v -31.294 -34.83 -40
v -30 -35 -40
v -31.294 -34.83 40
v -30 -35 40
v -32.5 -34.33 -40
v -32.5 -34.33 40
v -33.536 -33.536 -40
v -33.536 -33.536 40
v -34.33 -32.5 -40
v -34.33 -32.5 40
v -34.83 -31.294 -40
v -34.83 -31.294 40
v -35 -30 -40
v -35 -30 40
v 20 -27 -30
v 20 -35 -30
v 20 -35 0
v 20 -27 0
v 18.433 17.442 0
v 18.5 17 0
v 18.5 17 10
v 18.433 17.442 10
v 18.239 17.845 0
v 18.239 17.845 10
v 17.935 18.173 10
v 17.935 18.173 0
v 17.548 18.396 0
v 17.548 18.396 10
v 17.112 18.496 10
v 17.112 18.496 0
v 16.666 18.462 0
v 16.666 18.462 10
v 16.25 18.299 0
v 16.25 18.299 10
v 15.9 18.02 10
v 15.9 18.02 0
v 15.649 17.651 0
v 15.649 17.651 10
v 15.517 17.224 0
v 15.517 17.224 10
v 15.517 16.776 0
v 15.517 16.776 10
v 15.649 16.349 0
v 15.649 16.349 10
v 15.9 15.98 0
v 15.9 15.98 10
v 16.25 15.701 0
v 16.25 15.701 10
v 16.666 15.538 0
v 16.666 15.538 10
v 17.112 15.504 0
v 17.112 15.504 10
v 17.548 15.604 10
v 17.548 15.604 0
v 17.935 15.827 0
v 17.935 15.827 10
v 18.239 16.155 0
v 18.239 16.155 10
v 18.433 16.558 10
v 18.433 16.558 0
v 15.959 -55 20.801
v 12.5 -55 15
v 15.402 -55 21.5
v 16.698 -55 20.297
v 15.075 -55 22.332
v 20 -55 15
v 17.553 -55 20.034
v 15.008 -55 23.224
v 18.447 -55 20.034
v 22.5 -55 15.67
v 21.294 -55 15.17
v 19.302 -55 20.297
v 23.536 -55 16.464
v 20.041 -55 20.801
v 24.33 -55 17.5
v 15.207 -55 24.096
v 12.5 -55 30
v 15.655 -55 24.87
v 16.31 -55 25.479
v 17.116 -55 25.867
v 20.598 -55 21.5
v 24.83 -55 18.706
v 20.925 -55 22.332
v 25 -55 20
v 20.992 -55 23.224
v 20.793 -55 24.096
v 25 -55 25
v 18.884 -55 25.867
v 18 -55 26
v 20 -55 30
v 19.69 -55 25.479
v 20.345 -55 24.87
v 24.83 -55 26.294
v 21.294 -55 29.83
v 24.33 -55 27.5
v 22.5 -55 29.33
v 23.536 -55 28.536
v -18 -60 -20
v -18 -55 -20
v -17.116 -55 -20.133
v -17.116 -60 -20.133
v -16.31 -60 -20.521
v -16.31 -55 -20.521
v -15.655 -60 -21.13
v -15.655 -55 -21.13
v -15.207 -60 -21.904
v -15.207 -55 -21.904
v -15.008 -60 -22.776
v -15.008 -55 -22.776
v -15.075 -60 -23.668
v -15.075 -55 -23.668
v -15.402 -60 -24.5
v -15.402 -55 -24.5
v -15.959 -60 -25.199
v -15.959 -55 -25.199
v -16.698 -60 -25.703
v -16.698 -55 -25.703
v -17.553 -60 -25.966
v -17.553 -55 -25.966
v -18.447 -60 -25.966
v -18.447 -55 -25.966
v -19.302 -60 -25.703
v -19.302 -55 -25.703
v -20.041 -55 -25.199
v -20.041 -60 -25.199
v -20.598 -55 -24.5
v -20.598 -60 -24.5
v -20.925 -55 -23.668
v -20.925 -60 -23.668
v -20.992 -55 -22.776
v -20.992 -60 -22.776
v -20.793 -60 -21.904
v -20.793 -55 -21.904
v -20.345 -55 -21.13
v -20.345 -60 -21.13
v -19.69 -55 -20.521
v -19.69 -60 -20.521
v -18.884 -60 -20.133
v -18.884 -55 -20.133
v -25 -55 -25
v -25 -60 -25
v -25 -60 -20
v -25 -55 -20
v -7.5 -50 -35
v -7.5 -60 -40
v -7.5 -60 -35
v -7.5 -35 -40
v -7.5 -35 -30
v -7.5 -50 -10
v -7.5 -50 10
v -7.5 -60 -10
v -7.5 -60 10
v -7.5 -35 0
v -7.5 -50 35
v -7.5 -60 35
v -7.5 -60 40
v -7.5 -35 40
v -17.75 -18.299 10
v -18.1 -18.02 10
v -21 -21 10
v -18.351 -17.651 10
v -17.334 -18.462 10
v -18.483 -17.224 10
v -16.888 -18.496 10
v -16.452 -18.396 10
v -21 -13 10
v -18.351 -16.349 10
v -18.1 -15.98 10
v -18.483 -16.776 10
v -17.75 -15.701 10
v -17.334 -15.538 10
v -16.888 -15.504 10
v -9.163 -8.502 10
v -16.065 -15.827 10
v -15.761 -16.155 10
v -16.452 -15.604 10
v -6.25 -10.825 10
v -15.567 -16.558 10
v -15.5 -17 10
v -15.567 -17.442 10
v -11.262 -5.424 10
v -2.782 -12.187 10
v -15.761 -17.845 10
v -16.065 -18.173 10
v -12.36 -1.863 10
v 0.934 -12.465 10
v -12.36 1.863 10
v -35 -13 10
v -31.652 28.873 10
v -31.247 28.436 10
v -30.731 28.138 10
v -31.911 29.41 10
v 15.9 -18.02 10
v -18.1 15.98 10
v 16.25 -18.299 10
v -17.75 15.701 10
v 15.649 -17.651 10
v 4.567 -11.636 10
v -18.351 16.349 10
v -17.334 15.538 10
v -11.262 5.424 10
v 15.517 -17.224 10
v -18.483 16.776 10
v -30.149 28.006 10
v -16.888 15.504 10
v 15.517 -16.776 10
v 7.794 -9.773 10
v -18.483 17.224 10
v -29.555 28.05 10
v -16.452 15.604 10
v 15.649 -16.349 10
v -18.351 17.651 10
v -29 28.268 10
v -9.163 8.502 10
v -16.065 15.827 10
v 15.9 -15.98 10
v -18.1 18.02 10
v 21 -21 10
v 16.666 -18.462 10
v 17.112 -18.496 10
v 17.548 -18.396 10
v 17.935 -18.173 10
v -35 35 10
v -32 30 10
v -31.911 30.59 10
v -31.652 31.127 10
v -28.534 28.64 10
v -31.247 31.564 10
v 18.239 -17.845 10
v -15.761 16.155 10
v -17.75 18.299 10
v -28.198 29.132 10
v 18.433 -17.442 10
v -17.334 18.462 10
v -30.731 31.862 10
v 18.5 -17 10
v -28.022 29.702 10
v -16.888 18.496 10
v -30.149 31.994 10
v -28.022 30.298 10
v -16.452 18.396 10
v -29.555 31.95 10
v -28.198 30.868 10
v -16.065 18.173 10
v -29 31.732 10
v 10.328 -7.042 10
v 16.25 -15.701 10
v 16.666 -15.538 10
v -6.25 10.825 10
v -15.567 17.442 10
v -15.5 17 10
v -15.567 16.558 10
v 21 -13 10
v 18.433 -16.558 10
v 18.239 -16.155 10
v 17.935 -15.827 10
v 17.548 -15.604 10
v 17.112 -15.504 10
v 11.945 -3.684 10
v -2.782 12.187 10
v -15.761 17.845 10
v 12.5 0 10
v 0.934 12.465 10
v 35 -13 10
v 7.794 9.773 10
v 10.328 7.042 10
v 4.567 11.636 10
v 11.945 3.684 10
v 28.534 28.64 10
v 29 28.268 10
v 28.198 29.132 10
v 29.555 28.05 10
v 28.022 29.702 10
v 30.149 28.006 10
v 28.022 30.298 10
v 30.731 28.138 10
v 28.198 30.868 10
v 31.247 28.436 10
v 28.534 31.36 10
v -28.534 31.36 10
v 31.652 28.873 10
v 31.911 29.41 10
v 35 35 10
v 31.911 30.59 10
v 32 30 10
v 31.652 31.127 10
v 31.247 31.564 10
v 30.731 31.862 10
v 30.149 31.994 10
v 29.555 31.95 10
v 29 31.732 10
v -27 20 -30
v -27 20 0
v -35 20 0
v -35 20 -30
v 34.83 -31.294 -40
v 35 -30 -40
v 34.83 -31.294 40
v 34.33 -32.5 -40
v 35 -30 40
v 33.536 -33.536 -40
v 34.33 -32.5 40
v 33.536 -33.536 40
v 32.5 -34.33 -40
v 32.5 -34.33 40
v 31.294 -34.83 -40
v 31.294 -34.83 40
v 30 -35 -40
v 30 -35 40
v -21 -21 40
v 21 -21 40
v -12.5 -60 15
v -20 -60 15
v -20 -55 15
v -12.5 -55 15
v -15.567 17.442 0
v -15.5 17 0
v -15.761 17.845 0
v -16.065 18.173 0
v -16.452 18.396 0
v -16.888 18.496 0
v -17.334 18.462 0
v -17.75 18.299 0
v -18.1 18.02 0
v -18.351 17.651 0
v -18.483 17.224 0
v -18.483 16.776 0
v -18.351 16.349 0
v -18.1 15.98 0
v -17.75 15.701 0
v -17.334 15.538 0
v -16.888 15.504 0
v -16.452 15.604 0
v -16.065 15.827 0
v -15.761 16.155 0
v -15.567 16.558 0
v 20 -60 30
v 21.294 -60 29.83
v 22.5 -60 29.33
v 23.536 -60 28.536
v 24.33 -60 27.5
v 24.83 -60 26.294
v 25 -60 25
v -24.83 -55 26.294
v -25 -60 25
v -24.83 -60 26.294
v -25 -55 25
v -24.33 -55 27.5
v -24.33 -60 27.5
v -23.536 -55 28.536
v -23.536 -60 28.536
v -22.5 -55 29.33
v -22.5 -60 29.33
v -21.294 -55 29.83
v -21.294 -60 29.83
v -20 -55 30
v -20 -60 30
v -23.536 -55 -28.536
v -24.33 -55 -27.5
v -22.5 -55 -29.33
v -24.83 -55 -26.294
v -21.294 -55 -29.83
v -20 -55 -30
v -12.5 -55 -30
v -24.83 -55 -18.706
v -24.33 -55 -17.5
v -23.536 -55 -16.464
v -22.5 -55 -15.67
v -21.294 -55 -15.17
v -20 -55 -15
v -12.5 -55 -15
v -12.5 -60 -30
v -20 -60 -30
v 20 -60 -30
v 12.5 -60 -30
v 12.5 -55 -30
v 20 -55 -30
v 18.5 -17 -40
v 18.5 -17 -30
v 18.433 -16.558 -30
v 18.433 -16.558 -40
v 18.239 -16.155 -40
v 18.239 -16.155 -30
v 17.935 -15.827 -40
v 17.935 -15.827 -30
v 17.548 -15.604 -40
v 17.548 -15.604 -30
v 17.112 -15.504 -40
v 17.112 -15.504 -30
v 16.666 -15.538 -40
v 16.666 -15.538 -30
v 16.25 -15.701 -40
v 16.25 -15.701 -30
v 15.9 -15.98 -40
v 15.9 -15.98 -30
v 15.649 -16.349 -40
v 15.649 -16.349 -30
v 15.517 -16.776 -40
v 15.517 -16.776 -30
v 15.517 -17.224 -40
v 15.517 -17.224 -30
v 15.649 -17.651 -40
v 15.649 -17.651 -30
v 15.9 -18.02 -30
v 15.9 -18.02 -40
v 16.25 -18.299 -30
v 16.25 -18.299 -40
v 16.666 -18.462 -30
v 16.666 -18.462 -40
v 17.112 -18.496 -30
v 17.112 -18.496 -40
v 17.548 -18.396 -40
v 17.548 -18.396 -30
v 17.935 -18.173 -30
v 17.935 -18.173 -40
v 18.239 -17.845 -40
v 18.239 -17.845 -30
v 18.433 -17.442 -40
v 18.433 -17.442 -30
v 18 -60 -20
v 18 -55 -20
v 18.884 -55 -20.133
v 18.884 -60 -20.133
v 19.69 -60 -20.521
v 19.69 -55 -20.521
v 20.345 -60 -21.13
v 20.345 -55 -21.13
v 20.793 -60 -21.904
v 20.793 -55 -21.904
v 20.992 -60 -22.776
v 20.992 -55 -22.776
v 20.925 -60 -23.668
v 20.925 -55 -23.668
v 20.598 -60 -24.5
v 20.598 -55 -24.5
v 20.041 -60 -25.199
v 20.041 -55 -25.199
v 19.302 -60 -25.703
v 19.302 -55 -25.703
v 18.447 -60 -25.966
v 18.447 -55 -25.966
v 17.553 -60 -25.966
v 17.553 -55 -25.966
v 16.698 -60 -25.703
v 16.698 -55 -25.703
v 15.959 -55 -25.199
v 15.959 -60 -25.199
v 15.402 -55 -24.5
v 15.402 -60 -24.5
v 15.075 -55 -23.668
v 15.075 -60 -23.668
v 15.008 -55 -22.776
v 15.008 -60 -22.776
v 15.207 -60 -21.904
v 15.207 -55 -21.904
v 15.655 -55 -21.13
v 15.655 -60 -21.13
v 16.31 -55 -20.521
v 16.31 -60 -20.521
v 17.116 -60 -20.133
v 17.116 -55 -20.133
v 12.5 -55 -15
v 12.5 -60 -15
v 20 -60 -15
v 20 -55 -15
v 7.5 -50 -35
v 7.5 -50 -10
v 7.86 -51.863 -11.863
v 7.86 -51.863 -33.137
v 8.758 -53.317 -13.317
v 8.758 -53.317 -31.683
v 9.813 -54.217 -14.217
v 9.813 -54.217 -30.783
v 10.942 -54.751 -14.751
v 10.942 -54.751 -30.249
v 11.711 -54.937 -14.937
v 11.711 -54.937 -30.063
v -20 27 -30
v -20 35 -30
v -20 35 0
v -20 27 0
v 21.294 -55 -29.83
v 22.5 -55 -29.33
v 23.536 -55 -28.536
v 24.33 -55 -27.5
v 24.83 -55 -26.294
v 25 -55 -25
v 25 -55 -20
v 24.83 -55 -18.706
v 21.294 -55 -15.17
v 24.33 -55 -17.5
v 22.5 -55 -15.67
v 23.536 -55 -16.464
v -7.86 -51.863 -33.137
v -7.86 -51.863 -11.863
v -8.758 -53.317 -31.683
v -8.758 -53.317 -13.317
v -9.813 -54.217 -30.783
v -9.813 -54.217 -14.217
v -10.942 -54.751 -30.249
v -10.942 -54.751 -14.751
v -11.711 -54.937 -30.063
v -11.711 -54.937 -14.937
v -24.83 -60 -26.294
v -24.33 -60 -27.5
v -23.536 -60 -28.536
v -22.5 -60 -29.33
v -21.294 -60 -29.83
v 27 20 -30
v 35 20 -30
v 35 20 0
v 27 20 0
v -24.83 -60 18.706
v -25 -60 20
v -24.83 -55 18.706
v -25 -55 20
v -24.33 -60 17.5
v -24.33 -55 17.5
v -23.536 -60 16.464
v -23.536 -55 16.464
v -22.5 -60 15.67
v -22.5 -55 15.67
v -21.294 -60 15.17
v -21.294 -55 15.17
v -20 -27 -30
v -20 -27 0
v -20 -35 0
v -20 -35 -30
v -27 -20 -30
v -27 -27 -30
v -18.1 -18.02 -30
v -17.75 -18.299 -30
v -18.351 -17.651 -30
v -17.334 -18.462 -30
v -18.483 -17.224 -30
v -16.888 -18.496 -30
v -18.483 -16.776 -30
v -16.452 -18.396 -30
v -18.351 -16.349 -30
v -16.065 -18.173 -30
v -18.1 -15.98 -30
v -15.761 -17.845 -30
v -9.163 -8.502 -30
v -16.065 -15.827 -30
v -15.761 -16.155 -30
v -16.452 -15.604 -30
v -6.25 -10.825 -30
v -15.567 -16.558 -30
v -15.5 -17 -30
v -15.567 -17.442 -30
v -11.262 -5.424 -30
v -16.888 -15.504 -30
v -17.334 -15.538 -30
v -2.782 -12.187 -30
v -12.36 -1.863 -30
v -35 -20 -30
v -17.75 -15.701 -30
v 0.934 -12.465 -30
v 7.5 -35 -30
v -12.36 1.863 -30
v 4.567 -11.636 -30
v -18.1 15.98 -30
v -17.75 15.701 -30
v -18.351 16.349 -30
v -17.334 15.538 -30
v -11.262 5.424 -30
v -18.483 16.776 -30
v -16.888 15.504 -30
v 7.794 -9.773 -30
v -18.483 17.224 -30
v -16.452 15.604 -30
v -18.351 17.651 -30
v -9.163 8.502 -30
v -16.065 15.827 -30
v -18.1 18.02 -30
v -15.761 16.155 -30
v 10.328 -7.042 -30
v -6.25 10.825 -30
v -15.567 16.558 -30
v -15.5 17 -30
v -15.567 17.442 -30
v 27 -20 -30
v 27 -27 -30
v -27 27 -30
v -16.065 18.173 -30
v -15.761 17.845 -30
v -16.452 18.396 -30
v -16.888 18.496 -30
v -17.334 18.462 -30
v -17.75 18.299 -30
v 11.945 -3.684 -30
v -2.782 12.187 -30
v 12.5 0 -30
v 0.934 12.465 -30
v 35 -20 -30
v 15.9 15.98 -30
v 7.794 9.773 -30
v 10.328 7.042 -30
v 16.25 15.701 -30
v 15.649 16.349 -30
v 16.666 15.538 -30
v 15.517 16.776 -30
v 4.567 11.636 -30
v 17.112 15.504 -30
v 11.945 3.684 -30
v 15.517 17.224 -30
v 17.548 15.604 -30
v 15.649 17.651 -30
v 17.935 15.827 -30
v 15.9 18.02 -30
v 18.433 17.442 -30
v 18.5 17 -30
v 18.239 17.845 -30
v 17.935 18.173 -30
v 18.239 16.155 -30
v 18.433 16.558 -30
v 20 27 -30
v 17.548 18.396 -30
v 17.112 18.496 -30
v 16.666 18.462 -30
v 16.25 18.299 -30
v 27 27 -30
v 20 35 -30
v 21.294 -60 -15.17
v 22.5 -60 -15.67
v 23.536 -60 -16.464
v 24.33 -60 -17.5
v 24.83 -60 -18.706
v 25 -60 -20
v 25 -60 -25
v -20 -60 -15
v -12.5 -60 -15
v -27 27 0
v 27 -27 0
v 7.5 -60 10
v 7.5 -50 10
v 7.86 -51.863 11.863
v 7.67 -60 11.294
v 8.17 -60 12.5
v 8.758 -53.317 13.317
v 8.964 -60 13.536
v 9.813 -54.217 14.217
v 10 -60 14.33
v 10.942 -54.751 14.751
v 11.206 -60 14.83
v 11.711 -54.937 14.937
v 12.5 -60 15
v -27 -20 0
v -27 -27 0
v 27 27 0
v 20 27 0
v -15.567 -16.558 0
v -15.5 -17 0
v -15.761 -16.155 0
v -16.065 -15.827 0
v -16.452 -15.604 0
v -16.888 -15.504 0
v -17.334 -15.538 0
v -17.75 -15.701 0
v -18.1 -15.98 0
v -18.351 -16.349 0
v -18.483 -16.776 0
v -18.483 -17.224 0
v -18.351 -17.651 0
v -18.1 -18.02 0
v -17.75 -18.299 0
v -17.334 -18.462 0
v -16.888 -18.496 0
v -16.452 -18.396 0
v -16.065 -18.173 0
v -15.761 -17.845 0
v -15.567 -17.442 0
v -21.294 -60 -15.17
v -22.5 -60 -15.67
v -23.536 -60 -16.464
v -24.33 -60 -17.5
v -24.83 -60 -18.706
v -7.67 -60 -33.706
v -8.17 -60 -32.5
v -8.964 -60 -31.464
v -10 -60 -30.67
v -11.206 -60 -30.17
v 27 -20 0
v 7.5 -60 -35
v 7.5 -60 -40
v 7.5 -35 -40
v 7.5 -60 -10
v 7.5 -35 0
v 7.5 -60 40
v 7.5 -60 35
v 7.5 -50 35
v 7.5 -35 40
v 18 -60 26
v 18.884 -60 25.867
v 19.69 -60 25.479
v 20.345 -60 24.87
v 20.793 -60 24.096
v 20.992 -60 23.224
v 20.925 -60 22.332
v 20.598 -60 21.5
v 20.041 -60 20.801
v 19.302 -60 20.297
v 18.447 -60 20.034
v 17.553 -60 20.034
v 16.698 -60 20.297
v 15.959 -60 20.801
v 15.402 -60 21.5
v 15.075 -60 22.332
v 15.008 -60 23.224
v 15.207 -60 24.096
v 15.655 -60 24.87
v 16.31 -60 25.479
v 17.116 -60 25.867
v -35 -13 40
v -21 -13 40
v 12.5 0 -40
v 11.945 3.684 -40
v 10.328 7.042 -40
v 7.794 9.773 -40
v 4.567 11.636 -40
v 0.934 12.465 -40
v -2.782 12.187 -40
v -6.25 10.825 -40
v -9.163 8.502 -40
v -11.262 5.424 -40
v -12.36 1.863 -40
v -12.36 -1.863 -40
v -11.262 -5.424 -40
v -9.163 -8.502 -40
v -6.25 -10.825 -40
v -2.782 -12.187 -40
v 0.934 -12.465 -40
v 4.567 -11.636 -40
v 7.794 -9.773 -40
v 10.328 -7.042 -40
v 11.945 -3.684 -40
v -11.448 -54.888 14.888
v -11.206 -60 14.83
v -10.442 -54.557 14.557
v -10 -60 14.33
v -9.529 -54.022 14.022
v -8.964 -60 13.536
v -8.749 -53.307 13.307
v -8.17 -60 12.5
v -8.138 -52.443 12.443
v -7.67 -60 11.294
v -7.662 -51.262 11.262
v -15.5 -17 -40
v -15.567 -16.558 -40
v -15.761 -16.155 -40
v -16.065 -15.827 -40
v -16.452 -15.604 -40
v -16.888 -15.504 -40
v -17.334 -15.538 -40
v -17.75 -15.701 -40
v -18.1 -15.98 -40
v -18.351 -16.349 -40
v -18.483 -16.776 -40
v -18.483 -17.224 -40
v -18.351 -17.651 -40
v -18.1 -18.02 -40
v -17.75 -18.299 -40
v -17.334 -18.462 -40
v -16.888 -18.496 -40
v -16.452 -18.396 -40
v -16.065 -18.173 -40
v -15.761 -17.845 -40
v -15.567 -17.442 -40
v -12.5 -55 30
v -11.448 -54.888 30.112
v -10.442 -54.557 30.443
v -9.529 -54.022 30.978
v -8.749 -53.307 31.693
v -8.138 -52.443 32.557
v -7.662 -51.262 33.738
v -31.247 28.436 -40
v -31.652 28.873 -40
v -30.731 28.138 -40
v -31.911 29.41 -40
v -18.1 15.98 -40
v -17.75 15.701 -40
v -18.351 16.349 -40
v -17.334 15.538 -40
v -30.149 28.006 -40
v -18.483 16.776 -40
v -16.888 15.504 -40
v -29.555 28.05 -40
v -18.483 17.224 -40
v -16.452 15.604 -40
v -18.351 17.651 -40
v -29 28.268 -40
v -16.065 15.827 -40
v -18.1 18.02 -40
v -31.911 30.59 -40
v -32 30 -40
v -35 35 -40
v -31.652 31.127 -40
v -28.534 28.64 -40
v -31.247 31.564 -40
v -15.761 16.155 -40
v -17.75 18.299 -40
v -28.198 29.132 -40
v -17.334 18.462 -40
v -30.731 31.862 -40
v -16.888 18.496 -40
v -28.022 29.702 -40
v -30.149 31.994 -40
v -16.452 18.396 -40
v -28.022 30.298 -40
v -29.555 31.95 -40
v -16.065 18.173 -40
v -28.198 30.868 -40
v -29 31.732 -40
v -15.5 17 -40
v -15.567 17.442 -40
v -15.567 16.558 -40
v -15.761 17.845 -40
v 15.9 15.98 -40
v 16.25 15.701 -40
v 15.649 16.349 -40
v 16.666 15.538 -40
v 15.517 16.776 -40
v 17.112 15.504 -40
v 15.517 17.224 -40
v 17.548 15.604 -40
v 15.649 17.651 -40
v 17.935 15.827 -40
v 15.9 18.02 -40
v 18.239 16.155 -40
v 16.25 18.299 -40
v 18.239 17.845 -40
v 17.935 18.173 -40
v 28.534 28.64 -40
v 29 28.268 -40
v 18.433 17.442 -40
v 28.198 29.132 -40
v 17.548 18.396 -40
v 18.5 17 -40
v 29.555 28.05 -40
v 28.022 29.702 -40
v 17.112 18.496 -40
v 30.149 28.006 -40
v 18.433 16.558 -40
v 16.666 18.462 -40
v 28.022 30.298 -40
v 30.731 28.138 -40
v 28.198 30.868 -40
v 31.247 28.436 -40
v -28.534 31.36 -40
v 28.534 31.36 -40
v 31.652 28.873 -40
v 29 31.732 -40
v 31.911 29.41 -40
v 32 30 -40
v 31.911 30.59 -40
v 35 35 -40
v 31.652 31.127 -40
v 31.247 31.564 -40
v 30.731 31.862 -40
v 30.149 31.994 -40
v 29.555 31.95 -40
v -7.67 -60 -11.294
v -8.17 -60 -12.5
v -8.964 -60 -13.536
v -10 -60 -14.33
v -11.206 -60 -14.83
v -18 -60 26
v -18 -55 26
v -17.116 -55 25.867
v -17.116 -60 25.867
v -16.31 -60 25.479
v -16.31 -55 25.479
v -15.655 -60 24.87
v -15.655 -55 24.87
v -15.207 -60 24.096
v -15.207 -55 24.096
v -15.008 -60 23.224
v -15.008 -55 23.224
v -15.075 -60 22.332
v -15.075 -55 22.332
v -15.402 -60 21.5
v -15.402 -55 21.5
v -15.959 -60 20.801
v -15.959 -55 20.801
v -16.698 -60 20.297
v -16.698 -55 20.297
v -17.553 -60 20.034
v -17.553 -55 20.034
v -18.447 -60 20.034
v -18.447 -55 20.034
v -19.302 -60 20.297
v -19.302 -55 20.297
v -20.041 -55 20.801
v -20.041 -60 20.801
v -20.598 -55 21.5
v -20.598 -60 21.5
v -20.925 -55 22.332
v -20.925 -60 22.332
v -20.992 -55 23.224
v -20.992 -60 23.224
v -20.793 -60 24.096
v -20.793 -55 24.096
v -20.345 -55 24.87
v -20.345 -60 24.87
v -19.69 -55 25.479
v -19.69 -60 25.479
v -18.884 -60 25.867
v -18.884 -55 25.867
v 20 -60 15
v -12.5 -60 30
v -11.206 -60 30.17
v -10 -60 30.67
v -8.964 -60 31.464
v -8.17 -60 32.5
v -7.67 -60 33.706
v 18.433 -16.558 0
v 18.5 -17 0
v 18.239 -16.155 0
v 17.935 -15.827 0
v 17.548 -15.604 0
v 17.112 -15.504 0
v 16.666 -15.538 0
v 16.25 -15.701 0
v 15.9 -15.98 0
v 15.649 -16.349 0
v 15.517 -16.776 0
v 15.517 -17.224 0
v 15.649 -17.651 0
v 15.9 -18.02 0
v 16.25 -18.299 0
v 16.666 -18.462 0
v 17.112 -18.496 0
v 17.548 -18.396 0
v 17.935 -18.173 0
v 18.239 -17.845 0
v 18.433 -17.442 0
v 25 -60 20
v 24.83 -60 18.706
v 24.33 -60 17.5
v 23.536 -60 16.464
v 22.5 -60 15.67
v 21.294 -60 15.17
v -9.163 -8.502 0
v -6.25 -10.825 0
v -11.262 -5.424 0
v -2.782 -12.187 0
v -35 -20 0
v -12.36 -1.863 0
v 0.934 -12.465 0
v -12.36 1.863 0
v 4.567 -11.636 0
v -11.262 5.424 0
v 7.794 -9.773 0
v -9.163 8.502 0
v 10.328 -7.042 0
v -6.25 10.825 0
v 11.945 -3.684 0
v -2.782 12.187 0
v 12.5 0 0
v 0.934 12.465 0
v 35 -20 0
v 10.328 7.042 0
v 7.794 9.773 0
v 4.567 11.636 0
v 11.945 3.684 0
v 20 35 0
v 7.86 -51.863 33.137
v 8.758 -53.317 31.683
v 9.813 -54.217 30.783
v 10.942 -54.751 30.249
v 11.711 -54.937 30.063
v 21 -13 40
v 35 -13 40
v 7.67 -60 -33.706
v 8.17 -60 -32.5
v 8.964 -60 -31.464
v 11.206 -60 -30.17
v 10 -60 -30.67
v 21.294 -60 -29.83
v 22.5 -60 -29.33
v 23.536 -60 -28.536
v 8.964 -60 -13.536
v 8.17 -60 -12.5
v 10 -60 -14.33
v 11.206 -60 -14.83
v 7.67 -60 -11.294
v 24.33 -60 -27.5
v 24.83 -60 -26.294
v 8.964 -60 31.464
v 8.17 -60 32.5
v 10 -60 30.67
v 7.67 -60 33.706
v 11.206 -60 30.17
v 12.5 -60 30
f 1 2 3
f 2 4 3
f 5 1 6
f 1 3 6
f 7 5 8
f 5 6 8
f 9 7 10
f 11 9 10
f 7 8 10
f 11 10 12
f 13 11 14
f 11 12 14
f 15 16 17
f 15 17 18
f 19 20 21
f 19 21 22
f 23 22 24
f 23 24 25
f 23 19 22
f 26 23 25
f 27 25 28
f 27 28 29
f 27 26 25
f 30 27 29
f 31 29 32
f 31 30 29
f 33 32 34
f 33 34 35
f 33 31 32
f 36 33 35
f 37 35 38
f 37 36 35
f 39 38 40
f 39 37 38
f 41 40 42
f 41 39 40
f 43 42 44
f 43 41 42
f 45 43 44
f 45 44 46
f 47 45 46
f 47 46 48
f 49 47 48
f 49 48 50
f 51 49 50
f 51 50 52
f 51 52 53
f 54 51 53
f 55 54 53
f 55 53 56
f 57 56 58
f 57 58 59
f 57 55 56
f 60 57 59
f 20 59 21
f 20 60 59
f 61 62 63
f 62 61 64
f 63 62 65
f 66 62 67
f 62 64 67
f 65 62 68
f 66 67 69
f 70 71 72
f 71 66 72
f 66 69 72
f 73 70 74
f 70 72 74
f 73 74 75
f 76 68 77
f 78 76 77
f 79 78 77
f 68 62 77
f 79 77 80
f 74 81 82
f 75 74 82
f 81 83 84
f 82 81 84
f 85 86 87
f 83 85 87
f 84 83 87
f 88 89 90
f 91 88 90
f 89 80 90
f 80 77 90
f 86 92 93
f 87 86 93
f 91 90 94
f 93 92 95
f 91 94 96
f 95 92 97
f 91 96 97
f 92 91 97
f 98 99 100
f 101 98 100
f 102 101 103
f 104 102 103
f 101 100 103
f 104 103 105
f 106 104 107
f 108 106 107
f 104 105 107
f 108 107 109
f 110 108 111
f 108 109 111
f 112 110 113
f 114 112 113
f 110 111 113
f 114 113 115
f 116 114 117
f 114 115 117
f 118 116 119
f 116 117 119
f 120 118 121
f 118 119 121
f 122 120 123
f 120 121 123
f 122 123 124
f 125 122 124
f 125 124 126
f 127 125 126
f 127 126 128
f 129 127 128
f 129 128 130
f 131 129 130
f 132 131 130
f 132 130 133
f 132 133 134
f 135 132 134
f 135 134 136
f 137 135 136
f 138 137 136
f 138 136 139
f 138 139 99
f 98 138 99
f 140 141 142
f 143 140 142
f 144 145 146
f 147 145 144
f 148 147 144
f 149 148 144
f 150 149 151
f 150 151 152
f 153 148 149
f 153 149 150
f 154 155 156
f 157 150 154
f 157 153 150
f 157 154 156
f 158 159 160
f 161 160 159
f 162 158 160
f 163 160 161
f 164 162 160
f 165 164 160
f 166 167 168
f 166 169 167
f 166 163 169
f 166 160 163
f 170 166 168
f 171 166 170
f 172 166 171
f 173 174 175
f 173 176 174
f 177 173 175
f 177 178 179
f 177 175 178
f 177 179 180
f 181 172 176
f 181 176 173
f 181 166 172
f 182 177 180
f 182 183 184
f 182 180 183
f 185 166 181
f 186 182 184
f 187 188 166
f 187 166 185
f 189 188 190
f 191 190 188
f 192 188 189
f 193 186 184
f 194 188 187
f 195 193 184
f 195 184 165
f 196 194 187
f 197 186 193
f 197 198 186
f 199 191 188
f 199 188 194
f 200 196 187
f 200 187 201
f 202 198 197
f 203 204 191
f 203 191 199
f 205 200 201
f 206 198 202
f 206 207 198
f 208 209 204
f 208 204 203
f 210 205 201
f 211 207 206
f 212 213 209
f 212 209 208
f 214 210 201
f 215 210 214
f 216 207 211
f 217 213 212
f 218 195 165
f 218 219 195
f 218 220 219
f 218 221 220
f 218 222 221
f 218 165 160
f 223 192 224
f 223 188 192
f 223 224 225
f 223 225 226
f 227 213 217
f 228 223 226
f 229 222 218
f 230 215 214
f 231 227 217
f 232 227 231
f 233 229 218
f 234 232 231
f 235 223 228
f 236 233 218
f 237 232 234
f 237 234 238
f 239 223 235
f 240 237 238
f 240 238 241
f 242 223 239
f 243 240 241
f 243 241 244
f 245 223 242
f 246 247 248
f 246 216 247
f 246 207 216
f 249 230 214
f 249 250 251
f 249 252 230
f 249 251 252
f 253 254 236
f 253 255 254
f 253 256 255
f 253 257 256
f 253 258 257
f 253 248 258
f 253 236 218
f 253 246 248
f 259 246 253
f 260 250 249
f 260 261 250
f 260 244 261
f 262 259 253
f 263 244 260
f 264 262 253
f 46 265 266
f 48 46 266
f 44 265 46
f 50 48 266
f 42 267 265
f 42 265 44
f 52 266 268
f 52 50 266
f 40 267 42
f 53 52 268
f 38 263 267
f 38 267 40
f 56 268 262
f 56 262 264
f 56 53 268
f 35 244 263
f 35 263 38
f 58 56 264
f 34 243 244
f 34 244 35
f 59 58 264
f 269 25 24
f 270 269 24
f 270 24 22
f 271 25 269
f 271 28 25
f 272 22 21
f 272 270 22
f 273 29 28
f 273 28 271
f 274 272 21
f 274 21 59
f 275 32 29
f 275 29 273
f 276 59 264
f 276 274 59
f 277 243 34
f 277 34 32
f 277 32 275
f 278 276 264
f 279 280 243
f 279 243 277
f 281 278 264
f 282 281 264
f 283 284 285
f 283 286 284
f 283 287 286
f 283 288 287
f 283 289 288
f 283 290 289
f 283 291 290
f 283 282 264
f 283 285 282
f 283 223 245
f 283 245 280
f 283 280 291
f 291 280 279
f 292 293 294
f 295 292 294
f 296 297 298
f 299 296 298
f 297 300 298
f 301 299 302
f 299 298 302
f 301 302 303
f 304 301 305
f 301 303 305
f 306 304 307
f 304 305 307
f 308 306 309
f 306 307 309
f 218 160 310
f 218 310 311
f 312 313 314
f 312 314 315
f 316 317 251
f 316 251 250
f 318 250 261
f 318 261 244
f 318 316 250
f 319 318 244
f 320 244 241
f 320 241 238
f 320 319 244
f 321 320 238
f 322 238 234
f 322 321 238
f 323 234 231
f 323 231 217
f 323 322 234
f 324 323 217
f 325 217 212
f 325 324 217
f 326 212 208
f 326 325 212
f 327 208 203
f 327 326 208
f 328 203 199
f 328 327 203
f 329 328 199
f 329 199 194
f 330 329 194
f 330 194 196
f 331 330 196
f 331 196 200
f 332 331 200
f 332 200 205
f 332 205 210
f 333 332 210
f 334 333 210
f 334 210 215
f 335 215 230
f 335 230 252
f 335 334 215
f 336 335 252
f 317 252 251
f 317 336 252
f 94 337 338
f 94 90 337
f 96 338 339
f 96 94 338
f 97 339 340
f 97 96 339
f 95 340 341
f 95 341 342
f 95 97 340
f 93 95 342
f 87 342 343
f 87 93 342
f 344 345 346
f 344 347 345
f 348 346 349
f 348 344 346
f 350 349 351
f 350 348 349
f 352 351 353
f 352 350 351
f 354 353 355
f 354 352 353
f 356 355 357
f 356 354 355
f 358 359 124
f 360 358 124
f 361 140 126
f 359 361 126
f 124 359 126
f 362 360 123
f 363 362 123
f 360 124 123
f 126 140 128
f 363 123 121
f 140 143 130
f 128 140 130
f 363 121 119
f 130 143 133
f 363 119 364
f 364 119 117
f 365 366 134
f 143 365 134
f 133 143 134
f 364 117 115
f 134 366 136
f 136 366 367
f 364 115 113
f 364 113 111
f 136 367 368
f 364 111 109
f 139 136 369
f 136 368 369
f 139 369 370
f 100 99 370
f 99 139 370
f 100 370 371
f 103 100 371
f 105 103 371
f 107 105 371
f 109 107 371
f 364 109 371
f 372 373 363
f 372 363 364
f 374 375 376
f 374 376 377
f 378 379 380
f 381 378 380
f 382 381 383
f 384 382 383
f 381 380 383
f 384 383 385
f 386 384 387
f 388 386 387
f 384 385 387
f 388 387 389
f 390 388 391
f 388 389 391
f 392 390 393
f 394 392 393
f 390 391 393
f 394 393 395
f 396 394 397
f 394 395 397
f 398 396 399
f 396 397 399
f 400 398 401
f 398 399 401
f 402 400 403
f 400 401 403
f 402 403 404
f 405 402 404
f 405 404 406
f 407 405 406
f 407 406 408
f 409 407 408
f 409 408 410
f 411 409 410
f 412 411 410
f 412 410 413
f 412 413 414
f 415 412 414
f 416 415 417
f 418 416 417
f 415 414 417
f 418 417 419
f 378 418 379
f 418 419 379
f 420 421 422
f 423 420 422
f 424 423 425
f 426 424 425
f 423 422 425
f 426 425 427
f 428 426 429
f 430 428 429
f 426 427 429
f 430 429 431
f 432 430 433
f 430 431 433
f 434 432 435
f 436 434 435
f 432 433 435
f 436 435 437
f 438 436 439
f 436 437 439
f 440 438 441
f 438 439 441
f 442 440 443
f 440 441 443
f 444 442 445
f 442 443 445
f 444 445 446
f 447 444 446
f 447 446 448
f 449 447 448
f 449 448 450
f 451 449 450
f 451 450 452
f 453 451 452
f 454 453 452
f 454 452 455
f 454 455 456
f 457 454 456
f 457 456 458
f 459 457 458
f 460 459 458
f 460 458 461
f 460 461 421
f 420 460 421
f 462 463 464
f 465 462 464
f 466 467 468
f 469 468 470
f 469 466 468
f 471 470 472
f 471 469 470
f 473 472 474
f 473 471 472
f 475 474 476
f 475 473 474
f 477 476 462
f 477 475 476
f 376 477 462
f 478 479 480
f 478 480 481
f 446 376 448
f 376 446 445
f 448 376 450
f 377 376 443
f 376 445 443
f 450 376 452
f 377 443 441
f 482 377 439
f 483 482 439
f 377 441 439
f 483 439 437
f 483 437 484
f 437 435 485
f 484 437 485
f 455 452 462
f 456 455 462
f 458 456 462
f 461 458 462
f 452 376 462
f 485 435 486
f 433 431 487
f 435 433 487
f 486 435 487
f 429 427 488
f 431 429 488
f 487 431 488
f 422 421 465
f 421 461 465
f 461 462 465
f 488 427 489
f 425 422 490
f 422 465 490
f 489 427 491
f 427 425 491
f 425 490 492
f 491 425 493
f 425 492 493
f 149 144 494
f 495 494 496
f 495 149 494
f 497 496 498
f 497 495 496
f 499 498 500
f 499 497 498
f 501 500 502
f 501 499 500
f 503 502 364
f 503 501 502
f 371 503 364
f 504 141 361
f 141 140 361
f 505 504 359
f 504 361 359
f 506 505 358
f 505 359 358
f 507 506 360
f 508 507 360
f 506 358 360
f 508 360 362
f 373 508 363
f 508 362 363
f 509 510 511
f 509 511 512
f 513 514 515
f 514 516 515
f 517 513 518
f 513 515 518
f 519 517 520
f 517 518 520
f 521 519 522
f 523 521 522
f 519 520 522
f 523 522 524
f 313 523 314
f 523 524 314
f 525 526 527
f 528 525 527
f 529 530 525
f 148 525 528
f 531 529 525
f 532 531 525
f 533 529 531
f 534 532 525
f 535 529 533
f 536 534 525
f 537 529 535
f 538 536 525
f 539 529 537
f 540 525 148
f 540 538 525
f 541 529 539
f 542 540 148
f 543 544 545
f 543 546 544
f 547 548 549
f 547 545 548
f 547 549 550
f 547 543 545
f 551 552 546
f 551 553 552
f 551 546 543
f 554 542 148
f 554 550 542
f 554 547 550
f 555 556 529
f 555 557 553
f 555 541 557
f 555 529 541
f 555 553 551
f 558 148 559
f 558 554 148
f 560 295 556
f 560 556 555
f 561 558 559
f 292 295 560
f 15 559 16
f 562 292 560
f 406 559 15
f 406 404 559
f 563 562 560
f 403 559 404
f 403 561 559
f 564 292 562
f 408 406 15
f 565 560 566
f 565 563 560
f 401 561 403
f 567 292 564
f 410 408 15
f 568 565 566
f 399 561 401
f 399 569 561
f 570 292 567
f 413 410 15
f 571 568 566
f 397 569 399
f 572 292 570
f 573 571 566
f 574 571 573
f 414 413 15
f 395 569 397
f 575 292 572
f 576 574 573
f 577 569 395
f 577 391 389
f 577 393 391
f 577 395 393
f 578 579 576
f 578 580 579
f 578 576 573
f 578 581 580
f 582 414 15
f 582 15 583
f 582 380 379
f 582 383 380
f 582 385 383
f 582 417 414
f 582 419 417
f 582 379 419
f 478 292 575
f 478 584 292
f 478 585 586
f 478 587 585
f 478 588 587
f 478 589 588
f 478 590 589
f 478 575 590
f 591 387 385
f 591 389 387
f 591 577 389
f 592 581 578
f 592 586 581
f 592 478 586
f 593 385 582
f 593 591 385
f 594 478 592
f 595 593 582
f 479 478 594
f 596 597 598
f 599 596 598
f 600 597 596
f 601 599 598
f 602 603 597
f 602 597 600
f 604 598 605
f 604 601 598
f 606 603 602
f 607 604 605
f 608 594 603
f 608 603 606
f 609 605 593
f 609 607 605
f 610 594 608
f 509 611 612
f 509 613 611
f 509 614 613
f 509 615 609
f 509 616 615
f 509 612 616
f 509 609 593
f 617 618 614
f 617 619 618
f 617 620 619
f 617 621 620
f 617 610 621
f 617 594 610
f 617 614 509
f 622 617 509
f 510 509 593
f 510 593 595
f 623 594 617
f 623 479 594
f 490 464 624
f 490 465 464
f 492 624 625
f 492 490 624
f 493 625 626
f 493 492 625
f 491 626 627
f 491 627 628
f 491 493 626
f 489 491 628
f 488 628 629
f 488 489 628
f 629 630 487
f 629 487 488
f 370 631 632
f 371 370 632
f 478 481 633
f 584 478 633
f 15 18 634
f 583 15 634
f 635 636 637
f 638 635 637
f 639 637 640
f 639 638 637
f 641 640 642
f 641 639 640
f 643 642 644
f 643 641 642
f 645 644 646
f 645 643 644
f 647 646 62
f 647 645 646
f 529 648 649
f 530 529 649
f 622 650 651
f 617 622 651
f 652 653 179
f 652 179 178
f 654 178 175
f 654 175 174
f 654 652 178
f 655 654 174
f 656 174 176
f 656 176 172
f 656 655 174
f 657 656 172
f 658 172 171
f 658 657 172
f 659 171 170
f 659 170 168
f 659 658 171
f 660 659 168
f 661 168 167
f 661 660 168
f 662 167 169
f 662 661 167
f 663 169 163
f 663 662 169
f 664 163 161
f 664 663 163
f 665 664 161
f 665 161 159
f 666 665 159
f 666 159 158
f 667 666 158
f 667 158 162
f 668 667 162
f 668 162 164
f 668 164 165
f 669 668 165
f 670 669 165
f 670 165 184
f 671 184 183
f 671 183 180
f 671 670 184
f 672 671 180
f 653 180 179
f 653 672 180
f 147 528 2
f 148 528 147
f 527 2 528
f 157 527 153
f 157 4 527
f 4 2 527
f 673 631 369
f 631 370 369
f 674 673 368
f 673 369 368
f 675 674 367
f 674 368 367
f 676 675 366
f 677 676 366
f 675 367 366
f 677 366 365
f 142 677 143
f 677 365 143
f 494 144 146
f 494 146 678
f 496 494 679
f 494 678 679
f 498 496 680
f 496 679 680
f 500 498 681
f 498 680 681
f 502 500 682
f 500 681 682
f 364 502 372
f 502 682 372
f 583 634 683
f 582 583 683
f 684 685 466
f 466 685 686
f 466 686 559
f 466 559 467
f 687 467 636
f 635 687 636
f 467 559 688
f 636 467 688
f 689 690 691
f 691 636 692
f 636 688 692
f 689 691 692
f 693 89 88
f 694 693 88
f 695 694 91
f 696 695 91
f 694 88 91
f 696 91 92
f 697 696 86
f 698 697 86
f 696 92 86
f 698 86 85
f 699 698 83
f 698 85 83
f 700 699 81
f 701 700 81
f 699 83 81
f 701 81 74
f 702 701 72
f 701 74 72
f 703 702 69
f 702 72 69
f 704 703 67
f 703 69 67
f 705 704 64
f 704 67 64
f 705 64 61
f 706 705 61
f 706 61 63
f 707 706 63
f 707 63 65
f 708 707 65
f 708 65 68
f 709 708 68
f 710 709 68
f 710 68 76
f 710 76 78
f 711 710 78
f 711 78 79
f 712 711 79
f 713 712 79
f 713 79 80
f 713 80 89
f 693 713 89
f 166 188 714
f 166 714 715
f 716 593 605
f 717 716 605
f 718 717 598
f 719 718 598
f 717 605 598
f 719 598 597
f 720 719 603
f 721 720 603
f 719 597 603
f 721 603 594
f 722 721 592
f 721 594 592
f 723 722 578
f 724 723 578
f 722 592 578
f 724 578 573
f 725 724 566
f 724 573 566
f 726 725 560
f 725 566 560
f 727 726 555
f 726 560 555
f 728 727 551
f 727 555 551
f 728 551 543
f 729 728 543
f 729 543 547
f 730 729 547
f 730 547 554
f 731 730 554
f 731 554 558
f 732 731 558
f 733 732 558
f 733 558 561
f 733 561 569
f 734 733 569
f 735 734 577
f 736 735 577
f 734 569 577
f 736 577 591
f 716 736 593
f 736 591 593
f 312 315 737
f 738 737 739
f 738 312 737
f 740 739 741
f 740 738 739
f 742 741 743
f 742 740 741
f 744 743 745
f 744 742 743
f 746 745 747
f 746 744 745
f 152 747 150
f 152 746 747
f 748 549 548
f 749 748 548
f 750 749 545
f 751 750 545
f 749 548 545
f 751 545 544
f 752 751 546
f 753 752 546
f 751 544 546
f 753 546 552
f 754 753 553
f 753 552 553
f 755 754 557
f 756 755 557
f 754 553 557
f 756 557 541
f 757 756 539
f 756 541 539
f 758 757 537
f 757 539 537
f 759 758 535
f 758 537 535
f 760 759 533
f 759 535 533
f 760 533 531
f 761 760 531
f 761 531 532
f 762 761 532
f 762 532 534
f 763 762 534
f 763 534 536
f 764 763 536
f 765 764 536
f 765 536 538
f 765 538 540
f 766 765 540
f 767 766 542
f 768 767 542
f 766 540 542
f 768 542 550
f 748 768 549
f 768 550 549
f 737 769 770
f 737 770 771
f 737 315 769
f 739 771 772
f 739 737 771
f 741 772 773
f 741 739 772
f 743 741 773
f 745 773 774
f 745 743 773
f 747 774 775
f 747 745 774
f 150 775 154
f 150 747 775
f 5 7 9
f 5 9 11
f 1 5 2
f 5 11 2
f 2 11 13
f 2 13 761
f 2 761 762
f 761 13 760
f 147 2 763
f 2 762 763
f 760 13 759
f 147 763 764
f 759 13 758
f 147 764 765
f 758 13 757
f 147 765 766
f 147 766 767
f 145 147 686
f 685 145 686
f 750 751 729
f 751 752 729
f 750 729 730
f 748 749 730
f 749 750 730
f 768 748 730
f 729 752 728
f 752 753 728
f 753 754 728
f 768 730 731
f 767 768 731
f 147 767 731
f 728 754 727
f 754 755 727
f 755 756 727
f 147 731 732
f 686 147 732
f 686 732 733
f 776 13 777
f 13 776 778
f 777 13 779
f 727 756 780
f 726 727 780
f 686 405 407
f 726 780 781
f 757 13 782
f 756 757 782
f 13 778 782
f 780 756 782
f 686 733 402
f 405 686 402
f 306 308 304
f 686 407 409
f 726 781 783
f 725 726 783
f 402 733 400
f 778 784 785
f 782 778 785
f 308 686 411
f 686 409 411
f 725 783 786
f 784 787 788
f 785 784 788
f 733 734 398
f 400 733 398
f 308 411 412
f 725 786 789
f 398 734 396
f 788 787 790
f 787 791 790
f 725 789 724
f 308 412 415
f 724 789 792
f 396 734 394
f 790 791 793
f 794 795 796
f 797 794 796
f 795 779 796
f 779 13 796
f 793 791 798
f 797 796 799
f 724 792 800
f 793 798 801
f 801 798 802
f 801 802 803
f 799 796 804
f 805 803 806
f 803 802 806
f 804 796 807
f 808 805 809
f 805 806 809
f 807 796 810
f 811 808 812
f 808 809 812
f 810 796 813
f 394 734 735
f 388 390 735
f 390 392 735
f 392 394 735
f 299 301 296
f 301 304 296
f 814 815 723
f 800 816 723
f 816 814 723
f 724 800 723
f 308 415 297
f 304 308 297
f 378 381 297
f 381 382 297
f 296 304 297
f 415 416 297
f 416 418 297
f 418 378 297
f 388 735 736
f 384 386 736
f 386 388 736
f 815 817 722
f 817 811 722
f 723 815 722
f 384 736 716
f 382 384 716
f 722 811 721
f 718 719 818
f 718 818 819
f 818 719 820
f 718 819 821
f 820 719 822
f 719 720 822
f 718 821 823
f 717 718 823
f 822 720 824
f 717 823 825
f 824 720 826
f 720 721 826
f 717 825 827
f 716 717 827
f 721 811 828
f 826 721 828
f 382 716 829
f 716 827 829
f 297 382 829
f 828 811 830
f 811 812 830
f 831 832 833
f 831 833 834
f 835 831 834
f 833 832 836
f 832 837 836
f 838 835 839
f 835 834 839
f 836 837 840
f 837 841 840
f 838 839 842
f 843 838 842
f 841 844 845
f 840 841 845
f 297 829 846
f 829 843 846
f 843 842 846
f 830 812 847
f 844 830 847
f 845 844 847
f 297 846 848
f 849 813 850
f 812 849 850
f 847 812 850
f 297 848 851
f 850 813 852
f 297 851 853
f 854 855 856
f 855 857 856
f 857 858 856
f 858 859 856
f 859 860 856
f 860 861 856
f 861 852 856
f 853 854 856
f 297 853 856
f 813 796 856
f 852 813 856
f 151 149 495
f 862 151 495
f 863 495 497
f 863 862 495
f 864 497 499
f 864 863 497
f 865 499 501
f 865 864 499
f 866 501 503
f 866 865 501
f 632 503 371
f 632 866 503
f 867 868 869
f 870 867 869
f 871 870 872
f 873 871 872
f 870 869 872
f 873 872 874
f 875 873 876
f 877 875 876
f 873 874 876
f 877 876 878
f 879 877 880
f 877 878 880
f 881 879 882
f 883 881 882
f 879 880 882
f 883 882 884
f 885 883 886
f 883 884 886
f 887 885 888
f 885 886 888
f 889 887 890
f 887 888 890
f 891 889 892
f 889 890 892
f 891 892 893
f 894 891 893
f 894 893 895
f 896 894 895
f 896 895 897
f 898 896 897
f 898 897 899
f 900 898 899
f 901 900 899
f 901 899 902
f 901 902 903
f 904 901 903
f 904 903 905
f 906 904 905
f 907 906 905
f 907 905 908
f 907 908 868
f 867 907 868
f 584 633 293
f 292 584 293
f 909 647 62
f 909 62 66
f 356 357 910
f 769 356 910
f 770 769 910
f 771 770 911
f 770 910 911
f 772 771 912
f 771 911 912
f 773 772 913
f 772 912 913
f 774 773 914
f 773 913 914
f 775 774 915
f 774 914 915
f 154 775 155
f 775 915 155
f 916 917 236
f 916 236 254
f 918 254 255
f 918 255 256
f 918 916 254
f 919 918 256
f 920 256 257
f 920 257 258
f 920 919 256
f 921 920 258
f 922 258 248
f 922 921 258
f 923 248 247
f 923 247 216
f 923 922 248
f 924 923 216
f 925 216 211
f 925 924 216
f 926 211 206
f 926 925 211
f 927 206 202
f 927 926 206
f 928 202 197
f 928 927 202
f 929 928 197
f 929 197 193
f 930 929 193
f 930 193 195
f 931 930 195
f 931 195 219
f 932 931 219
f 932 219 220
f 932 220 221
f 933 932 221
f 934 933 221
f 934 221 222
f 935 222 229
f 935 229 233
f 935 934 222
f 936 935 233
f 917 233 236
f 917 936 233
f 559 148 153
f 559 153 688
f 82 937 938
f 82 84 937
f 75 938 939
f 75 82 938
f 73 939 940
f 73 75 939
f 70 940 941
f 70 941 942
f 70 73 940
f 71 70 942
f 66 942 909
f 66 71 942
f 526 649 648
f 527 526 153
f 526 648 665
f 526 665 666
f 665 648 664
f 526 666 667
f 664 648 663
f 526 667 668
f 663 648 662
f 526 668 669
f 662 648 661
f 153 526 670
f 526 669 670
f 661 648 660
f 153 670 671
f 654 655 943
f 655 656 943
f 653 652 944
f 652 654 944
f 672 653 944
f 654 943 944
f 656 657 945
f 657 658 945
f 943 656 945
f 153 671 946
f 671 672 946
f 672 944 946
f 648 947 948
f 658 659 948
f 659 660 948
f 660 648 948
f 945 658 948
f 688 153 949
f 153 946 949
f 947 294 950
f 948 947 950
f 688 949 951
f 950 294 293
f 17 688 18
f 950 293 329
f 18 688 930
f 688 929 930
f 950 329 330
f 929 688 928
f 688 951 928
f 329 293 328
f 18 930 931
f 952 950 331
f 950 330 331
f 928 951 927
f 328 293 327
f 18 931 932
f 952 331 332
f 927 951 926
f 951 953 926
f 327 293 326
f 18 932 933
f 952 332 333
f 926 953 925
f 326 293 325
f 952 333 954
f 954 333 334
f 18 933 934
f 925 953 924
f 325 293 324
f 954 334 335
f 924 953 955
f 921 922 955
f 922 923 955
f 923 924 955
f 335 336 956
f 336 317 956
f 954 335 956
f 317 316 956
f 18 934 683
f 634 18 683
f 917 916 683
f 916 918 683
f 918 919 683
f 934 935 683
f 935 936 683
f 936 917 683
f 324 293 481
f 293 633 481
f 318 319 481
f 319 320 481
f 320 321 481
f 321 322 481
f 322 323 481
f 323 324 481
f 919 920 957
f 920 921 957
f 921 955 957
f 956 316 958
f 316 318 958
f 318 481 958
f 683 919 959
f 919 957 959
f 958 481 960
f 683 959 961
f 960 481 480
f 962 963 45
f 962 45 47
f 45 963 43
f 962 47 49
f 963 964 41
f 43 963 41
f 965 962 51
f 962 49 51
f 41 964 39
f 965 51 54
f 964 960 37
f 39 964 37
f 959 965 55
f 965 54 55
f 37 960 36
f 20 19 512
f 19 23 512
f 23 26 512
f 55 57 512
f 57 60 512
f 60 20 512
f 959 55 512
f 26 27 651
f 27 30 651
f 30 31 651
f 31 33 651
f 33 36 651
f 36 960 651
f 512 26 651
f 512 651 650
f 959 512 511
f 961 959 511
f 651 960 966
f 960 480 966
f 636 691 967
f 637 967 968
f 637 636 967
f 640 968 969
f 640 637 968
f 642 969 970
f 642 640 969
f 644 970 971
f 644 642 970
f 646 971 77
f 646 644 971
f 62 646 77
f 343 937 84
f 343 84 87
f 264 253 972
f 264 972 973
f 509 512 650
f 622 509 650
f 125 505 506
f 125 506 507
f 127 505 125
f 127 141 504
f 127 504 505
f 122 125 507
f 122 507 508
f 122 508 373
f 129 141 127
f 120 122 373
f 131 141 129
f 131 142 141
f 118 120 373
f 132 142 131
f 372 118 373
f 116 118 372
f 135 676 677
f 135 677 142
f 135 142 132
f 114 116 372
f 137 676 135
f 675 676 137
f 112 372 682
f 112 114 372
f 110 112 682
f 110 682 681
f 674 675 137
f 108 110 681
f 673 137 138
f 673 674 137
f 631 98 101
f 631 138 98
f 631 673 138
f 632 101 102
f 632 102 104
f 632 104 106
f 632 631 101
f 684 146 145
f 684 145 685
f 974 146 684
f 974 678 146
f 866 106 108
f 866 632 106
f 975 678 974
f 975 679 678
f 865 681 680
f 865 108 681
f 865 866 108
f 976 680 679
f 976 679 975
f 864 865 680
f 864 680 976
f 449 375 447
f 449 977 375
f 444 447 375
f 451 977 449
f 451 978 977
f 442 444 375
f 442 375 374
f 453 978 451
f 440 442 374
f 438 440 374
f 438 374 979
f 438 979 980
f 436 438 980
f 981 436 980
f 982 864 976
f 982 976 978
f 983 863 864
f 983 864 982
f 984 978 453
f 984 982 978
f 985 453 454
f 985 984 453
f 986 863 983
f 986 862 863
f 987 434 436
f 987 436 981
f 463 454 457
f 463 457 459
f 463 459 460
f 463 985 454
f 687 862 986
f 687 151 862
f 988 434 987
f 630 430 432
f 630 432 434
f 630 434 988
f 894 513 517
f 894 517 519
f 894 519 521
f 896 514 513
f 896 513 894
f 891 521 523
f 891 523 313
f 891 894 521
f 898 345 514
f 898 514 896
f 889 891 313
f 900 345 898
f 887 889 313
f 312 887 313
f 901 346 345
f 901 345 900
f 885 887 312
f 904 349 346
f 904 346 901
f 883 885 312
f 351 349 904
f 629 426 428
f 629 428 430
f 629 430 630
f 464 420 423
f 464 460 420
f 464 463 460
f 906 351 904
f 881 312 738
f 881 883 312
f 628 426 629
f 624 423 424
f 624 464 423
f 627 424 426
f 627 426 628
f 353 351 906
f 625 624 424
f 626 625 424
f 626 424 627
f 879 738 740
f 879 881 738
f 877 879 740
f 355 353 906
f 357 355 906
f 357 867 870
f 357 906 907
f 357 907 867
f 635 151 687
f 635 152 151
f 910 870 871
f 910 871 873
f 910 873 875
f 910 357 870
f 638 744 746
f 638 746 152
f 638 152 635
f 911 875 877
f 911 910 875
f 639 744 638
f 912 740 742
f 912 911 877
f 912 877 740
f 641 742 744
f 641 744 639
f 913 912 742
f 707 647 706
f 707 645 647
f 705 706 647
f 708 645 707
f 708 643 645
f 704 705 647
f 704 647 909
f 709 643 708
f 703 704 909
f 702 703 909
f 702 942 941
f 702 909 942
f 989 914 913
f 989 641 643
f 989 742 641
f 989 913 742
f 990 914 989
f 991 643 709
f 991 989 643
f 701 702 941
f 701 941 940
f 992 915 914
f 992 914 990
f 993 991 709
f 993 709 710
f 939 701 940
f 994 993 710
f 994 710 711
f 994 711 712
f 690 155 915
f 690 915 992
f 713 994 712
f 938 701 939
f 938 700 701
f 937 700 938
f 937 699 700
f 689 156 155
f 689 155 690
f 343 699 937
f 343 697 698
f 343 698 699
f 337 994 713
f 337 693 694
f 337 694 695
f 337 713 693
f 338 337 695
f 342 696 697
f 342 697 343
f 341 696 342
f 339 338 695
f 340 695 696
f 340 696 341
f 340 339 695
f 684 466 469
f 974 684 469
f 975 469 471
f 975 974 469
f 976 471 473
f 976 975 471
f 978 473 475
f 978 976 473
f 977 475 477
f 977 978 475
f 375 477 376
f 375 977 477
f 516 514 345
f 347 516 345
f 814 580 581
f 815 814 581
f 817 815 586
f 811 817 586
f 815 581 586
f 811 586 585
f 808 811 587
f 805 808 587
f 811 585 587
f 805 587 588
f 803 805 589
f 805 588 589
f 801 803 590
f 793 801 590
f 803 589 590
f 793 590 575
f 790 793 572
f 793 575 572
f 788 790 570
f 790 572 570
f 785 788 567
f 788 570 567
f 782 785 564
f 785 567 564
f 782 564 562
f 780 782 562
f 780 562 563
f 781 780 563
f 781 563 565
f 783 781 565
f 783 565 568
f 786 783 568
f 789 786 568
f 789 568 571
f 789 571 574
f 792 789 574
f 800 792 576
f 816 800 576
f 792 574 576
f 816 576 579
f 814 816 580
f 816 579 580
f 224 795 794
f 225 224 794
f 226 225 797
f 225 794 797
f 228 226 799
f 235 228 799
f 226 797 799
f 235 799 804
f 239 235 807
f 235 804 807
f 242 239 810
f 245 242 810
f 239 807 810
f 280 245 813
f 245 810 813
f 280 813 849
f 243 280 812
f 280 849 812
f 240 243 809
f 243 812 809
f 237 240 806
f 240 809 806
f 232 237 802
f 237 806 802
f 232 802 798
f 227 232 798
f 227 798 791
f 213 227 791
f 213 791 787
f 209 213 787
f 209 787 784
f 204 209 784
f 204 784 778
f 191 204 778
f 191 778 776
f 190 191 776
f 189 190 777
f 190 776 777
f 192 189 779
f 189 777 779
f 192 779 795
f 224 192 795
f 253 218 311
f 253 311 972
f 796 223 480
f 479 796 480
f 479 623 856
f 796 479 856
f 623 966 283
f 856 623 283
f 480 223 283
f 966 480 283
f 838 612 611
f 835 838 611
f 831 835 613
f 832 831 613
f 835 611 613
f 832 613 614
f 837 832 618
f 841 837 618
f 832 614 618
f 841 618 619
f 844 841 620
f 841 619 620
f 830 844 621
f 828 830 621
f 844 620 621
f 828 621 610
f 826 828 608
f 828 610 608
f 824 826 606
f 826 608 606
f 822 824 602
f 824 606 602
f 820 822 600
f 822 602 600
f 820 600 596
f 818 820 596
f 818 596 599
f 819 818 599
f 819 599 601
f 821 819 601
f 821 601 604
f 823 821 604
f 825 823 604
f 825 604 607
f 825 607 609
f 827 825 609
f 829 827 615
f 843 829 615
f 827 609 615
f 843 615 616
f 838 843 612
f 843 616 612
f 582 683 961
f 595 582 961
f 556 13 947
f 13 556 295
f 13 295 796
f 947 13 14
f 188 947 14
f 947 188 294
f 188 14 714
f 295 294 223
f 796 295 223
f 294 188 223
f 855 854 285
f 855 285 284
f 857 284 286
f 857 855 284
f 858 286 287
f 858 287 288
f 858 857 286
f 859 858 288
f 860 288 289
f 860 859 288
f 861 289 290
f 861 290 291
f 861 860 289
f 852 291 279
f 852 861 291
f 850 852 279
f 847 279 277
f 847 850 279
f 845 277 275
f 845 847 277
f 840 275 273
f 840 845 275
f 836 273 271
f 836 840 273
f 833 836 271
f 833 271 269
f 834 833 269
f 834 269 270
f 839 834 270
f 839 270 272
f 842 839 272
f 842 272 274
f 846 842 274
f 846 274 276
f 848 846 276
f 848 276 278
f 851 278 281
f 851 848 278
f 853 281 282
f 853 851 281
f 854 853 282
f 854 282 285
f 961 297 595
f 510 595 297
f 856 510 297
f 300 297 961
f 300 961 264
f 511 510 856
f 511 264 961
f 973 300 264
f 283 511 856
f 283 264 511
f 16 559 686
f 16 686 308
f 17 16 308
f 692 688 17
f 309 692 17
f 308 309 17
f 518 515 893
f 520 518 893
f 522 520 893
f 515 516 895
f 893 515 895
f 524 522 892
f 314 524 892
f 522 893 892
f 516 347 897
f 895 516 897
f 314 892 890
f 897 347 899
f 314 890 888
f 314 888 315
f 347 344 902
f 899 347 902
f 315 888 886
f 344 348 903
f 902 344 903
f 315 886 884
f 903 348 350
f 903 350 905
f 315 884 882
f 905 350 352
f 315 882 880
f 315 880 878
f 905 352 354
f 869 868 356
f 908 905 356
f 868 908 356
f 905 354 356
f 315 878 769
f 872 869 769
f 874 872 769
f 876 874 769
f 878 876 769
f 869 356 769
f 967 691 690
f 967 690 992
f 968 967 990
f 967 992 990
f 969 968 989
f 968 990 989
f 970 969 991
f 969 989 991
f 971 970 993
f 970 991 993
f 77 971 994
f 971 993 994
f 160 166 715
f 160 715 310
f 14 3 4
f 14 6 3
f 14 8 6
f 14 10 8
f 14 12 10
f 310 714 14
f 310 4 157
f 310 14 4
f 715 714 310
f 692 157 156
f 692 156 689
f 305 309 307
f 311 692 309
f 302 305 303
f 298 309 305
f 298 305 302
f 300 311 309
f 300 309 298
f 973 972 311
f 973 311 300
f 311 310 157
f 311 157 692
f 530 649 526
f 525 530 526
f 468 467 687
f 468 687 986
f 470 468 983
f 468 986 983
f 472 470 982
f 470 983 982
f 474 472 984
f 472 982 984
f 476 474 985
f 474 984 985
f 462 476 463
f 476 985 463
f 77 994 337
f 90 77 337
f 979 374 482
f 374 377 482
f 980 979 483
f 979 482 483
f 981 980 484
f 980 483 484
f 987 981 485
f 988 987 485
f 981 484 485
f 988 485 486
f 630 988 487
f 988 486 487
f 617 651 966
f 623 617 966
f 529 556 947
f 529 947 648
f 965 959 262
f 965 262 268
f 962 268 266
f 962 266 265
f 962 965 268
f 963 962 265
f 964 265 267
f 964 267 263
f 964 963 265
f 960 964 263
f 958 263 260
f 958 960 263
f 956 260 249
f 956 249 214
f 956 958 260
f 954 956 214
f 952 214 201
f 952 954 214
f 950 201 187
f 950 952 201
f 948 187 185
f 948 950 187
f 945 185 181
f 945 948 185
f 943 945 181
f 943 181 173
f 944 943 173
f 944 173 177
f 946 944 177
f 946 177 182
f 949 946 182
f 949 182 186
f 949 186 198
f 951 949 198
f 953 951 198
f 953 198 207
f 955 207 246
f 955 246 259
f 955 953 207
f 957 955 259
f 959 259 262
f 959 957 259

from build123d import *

# Parameters (mm, degrees)
SKETCH1_W                 = 70
SKETCH1_H                 = 70
SKETCH1_R                 = 12.5
SKETCH1_R_2               = 1.5
BOSS_EXTRUDE1_DEPTH       = 10
BOSS_EXTRUDE2_DEPTH       = 30
BOSS_EXTRUDE3_DEPTH       = 30
CIRPATTERN1_COUNT         = 4
SKETCH4_R                 = 2
CUT_EXTRUDE1_DEPTH        = 50
SKETCH6_W                 = 15
SKETCH6_H                 = 80
BOSS_EXTRUDE4_DEPTH       = 25
SKETCH7_W                 = 50
SKETCH7_H                 = 15
BOSS_EXTRUDE5_DEPTH       = 5
F_6_0MM_DOWEL_HOLE1_D     = 6
F_6_0MM_DOWEL_HOLE1_DEPTH = 5
FILLET1_R                 = 5
FILLET2_R                 = 5
FILLET3_R                 = 5


with BuildPart() as part:
    # Sketch1 → Boss-Extrude1 (new body)
    with BuildSketch(Plane.XY):
        Rectangle(SKETCH1_W, SKETCH1_H)
        Circle(SKETCH1_R, mode=Mode.SUBTRACT)
        with Locations((17, 17)):
            Circle(SKETCH1_R_2, mode=Mode.SUBTRACT)
        with Locations((-17, 17)):
            Circle(SKETCH1_R_2, mode=Mode.SUBTRACT)
        with Locations((17, -17)):
            Circle(SKETCH1_R_2, mode=Mode.SUBTRACT)
        with Locations((-17, -17)):
            Circle(SKETCH1_R_2, mode=Mode.SUBTRACT)
    boss_extrude1 = extrude(amount=BOSS_EXTRUDE1_DEPTH)

    # Sketch2 → Boss-Extrude2 (add)
    with BuildSketch(Plane.XY.offset(10)):
        Polygon((-21, -13), (-21, -21), (21, -21), (21, -13), (35, -13), (35, -35), (-35, -35), (-35, -13), align=None)
    extrude(amount=BOSS_EXTRUDE2_DEPTH)

    # Sketch3 → Boss-Extrude3 (add)
    with BuildSketch(Plane(origin=(0, 0, 0), x_dir=(-1, 0, 0), z_dir=(0, 0, -1))):
        Polygon((27, 20), (35, 20), (35, 35), (20, 35), (20, 27), (27, 27), align=None)
    boss_extrude3 = extrude(amount=BOSS_EXTRUDE3_DEPTH)

    # CirPattern1: Boss-Extrude3 ×4 about axis
    cirpattern1_axis = Axis((0, 0, 0), (0, 0, 1))
    for i in range(1, CIRPATTERN1_COUNT):
        add(boss_extrude3.rotate(cirpattern1_axis, i * 360 / CIRPATTERN1_COUNT))

    # Mirror1: Boss-Extrude1 across plane
    add(boss_extrude1.mirror(Plane(origin=(0, 0, -15), x_dir=(1, 0, 0), z_dir=(0, 0, -1))))

    # Sketch4 → Cut-Extrude1 (cut)
    with BuildSketch(Plane(origin=(0, 0, -40), x_dir=(-1, 0, 0), z_dir=(0, 0, -1))):
        with Locations((30, 30)):
            Circle(SKETCH4_R)
    cut_extrude1 = extrude(amount=-CUT_EXTRUDE1_DEPTH, mode=Mode.SUBTRACT)

    # Mirror2: Cut-Extrude1 across plane
    add(cut_extrude1.mirror(Plane(origin=(0, 0, 0), x_dir=(0, 0, 1), z_dir=(1, 0, 0))), mode=Mode.SUBTRACT)

    # Sketch6 → Boss-Extrude4 (add)
    with BuildSketch(Plane.XZ.offset(35)):
        Rectangle(SKETCH6_W, SKETCH6_H)
    extrude(amount=BOSS_EXTRUDE4_DEPTH)

    # Sketch7 → Boss-Extrude5 (add)
    with BuildSketch(Plane.XZ.offset(60)):
        with Locations((0, 22.5)):
            Rectangle(SKETCH7_W, SKETCH7_H)
        with Locations((0, -22.5)):
            Rectangle(SKETCH7_W, SKETCH7_H)
    extrude(amount=-BOSS_EXTRUDE5_DEPTH)

    # Ø6.0mm Dowel Hole1
    with Locations(Plane(origin=(-18, -60, 23), x_dir=(0, 0, -1), z_dir=(0, -1, 0))):
        with Locations((0, 0), (0, 36), (46, 0), (46, 36)):
            Hole(F_6_0MM_DOWEL_HOLE1_D / 2, depth=F_6_0MM_DOWEL_HOLE1_DEPTH)

    # Fillet1
    fillet1_edges = [part.edges().sort_by_distance(p)[0] for p in [
        (25, -57.5, 15),
        (-25, -57.5, 30),
        (25, -57.5, 30),
        (7.5, -57.5, 15),
        (-7.5, -57.5, 15),
        (-25, -57.5, 15),
        (7.5, -57.5, 30),
        (-7.5, -57.5, 30),
        (25, -57.5, -30),
        (-25, -57.5, -15),
        (25, -57.5, -15),
        (7.5, -57.5, -30),
        (-7.5, -57.5, -30),
        (-25, -57.5, -30),
        (7.5, -57.5, -15),
        (-7.5, -57.5, -15),
    ]]
    fillet(fillet1_edges, radius=FILLET1_R)

    # Fillet2
    fillet2_edges = [part.edges().sort_by_distance(p)[0] for p in [
        (-7.5, -55, 22.5),
        (-7.5, -55, -22.5),
        (7.5, -55, -22.5),
        (7.5, -55, 22.5),
    ]]
    fillet(fillet2_edges, radius=FILLET2_R)

    # Fillet3
    fillet3_edges = [part.edges().sort_by_distance(p)[0] for p in [
        (-35, -35, 0),
        (35, -35, 0),
    ]]
    fillet(fillet3_edges, radius=FILLET3_R)


solid = part.part
